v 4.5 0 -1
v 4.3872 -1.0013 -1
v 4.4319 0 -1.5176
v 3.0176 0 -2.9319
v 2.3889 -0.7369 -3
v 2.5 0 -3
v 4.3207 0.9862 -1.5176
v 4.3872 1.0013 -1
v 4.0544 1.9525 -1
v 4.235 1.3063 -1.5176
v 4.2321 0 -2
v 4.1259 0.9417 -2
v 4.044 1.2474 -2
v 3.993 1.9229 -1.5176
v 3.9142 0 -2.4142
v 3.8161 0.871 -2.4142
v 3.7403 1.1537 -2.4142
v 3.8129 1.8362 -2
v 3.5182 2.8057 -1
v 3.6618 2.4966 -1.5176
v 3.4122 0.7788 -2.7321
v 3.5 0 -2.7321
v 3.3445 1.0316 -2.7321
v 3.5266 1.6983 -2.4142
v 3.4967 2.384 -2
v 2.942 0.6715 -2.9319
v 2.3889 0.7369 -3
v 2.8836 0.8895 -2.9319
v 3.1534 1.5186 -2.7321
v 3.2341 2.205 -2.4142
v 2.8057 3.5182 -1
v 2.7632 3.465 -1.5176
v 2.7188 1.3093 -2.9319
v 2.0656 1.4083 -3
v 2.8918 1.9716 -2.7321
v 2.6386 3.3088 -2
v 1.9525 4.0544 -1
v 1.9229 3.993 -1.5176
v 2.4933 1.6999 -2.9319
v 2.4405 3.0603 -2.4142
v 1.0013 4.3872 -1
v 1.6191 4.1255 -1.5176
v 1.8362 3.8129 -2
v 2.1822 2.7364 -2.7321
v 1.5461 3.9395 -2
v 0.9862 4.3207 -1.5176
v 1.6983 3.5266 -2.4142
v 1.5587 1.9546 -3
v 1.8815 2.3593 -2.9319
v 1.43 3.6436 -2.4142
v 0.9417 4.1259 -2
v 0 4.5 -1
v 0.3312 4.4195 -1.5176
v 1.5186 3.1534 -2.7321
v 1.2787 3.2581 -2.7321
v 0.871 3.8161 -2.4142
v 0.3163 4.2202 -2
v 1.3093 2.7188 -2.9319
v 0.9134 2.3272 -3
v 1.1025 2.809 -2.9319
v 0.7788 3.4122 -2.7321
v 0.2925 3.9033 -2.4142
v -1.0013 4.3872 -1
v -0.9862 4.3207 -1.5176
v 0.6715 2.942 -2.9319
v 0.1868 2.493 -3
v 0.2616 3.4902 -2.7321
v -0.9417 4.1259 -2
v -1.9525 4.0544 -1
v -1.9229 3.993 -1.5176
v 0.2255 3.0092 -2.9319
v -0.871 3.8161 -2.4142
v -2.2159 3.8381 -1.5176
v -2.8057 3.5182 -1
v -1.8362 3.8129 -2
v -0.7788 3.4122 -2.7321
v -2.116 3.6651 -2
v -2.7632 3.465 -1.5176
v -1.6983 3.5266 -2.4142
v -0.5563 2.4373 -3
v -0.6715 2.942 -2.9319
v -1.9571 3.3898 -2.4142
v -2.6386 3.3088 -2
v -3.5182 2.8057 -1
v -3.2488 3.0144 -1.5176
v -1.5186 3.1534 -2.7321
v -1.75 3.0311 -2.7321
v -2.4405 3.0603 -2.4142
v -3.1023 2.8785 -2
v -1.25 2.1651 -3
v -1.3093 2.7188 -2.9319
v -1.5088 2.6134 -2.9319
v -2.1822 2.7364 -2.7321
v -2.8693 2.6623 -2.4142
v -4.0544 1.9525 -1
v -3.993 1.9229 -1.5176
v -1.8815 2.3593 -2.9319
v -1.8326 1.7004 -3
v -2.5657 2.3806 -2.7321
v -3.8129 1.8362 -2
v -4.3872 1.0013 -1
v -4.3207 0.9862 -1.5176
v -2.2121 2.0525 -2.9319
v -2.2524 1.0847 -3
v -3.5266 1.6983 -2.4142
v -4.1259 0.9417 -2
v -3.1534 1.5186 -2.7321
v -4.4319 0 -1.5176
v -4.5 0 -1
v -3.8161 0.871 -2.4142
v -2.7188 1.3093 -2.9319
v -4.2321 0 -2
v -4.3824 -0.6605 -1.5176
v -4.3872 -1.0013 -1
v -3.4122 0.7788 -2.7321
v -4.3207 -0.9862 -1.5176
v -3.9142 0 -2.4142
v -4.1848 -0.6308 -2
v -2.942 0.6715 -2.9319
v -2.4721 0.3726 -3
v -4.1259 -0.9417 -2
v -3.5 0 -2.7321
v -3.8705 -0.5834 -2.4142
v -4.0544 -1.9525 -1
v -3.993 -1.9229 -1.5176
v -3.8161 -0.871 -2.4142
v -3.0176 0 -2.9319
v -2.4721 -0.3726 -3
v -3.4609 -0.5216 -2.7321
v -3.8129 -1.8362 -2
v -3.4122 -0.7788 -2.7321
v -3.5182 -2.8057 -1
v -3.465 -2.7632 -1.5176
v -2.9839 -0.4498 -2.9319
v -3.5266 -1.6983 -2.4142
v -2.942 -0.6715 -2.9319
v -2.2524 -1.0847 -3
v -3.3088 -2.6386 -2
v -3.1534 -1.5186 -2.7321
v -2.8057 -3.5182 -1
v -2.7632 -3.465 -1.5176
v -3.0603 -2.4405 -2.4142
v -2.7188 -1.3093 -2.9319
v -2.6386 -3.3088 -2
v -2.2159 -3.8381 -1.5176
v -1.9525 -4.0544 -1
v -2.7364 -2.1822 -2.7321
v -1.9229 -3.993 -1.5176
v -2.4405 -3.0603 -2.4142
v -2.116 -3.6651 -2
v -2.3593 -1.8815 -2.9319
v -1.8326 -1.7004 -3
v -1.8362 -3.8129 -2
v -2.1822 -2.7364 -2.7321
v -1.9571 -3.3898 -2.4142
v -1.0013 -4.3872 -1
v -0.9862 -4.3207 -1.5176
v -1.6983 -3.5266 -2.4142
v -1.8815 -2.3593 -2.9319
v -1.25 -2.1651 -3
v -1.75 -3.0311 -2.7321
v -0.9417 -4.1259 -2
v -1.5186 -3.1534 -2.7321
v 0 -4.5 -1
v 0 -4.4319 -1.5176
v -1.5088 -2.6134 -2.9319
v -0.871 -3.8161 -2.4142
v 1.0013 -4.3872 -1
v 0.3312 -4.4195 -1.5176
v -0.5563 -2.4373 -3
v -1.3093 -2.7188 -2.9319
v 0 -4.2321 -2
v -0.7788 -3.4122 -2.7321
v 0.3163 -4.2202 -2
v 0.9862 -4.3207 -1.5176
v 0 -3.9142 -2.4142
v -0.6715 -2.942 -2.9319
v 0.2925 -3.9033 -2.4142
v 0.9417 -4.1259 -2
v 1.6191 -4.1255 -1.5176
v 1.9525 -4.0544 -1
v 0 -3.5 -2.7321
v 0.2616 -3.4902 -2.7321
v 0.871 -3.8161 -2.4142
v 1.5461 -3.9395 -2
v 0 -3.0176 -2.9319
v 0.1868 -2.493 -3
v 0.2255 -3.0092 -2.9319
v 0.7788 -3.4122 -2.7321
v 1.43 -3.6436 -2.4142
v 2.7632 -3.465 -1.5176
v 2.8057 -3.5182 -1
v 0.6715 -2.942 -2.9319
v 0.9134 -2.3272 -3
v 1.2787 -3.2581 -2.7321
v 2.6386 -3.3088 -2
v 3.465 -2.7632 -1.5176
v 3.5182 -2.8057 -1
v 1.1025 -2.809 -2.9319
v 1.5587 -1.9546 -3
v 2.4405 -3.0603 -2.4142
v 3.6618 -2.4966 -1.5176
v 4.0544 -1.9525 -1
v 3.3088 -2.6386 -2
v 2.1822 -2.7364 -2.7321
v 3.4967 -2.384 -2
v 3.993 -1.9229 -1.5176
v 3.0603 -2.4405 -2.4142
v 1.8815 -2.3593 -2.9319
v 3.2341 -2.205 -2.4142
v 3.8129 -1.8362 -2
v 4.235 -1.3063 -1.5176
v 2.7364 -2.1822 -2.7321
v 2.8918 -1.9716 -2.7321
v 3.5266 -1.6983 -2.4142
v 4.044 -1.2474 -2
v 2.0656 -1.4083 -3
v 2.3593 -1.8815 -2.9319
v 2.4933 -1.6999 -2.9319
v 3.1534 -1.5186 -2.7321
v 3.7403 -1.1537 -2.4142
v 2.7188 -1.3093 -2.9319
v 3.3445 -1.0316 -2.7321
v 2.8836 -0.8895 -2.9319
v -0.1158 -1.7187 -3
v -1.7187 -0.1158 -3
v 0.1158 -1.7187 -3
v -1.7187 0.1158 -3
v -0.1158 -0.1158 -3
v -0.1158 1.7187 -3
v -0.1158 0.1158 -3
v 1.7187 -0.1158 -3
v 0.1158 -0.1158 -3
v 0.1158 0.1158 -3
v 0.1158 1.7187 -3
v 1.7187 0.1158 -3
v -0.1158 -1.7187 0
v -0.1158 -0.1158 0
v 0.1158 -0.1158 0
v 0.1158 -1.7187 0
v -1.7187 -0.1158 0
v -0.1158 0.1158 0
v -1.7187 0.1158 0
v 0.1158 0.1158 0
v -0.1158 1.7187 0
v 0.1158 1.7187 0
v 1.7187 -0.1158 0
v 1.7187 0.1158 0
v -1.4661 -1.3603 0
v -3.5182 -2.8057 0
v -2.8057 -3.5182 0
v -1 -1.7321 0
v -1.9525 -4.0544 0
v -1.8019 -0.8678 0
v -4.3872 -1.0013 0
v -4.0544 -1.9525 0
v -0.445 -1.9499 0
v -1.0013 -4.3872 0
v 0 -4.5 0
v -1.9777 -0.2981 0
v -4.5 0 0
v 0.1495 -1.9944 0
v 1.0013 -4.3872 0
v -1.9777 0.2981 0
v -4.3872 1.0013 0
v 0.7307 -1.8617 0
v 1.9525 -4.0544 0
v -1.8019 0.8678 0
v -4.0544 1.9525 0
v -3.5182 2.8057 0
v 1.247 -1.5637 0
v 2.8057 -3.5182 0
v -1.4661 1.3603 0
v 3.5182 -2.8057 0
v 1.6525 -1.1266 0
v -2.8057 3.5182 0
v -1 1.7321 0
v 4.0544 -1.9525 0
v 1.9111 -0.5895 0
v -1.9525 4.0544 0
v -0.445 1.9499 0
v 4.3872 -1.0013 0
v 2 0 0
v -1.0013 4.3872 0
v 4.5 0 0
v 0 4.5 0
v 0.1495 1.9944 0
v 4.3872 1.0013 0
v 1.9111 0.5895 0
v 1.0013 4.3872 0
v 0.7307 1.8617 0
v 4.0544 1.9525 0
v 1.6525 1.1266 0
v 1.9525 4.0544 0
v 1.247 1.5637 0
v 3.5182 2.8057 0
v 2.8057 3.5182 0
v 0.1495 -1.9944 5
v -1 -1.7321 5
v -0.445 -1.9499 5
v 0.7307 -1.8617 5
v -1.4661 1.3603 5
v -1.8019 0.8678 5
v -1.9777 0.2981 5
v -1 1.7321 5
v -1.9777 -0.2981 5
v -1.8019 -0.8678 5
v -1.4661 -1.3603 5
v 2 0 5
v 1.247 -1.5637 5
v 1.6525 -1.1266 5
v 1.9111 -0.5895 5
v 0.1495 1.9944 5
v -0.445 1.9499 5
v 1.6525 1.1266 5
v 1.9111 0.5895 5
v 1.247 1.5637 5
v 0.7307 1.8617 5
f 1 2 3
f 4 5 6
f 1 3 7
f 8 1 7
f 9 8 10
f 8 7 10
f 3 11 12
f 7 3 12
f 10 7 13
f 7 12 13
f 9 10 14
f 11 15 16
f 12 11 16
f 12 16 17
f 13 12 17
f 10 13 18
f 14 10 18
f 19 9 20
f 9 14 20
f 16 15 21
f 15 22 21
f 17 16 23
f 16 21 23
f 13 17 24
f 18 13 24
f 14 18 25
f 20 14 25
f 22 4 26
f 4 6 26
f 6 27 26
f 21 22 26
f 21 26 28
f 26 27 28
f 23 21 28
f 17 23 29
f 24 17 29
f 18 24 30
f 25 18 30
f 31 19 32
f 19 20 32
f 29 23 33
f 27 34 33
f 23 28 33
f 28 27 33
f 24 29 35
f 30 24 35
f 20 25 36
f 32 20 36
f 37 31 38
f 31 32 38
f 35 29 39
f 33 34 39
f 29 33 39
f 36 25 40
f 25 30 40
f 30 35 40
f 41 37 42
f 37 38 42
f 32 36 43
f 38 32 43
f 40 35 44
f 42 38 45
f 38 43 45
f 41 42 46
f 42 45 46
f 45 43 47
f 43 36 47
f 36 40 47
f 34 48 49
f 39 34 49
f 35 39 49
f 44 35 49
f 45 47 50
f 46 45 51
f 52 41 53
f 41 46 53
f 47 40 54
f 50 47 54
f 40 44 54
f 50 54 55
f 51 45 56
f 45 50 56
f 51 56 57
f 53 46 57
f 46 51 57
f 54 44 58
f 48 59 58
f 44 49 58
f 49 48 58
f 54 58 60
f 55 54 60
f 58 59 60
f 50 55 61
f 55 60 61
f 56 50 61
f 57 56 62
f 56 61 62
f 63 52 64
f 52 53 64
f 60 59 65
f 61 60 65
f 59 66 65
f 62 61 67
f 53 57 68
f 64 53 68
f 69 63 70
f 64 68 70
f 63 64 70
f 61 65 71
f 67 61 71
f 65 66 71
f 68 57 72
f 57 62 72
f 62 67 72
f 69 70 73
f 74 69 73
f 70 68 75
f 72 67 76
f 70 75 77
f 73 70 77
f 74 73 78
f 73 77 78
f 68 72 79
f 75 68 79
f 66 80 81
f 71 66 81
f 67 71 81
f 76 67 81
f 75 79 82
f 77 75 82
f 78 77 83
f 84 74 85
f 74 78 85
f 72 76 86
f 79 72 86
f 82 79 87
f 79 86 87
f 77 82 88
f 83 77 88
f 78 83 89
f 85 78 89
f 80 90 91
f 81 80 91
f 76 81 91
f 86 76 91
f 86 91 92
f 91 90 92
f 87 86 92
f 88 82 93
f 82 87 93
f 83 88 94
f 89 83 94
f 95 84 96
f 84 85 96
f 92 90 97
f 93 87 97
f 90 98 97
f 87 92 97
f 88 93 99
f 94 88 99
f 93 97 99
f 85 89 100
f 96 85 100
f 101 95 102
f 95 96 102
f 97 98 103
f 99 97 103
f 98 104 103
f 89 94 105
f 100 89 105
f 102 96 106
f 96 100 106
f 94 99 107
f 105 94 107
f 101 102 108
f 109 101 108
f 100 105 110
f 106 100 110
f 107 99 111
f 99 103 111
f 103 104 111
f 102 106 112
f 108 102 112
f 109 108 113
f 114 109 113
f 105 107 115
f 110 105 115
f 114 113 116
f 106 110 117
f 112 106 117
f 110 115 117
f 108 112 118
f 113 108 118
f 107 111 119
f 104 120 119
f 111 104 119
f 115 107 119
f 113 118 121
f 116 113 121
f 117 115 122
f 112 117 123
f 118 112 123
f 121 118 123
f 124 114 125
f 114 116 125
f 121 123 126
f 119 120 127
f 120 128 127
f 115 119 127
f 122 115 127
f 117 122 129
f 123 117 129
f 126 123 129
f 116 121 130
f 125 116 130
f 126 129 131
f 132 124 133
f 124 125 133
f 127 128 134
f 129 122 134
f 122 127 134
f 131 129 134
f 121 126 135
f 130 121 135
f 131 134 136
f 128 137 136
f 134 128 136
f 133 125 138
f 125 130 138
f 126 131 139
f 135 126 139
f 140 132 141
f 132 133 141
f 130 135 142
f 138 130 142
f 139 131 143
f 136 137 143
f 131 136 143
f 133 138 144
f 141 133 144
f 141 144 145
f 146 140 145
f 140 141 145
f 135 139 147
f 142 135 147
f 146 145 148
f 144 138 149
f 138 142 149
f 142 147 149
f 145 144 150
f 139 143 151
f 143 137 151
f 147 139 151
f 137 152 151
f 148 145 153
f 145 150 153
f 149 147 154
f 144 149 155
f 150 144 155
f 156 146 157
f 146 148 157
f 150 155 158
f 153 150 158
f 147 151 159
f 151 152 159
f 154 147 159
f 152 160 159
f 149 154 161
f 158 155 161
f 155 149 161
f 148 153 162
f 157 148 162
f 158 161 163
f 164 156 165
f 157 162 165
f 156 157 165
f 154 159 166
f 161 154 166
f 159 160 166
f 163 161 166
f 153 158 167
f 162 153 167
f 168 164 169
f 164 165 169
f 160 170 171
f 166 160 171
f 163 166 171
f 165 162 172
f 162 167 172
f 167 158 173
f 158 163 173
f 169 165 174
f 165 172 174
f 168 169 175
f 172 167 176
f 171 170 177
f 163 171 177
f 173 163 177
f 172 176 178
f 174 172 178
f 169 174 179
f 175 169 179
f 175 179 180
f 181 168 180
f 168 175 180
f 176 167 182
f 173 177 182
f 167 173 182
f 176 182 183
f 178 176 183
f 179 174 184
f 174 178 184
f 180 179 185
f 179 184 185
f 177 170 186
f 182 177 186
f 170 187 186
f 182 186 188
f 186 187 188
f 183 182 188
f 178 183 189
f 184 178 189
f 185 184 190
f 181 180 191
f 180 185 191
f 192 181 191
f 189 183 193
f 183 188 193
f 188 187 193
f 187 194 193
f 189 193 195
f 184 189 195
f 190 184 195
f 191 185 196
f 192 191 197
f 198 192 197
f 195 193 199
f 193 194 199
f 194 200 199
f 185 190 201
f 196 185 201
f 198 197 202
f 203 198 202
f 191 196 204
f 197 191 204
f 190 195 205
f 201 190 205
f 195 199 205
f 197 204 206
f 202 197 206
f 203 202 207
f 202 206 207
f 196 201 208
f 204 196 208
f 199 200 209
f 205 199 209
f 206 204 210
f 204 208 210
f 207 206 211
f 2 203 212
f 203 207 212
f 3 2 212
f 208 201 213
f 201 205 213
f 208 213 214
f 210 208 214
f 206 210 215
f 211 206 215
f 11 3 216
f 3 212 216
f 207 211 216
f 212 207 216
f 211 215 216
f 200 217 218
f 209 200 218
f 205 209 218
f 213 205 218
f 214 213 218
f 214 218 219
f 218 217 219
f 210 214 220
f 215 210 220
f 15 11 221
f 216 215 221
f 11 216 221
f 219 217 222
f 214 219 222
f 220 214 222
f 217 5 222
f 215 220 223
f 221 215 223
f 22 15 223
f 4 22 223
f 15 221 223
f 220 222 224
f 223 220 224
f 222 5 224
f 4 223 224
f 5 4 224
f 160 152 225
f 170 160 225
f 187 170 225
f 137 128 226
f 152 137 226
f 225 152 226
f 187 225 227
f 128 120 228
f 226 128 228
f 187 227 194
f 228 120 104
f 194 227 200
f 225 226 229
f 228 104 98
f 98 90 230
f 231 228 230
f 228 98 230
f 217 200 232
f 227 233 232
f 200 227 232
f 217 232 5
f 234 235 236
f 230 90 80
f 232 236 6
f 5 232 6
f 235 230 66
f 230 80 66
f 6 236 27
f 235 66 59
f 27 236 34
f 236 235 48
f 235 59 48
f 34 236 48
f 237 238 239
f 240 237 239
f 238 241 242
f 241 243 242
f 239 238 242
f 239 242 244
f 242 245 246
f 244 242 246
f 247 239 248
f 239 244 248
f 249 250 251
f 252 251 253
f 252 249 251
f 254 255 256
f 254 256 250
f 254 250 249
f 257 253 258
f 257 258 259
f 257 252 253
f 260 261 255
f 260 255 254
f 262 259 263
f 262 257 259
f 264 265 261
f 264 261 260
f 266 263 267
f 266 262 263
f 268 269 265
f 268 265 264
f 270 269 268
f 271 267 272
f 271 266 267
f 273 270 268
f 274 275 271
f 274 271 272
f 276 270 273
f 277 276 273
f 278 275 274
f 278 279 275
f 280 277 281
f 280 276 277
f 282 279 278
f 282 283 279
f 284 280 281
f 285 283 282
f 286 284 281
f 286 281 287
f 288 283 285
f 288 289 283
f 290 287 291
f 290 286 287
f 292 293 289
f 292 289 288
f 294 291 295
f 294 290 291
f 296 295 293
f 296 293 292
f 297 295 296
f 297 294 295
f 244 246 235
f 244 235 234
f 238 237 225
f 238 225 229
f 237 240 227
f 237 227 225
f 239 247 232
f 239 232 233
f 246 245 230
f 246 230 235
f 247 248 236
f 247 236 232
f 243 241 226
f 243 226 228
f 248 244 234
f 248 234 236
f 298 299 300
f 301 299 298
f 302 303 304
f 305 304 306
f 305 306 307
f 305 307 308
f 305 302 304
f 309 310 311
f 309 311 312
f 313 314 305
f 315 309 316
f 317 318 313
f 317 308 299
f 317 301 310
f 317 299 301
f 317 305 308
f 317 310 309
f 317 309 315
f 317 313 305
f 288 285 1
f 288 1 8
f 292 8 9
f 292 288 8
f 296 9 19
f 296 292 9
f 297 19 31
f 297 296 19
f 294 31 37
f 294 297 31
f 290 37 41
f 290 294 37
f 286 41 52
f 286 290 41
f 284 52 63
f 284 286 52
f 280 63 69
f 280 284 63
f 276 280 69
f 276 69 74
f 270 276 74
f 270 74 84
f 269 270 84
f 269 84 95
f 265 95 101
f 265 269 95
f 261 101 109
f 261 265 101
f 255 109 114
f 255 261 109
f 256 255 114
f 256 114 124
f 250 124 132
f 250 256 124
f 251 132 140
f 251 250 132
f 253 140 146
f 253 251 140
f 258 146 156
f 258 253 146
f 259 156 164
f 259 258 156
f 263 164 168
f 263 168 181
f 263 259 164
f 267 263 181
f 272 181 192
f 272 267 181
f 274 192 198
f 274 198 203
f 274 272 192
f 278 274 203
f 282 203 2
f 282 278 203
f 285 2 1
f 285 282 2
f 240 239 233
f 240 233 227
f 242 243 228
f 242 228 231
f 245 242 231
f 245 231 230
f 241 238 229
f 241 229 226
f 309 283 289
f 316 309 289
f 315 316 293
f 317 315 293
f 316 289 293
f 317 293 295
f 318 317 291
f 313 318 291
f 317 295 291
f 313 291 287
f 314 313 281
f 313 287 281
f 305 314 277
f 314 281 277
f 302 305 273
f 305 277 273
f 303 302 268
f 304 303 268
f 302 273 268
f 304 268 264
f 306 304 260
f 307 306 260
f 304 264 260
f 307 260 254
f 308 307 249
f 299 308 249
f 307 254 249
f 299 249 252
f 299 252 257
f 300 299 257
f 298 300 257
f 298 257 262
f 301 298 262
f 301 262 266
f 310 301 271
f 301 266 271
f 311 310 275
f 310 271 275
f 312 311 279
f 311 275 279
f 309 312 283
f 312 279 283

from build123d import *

# Parameters (mm, degrees)
ESQUISSE1_R        = 2
BOSS_EXTRU_1_DEPTH = 5
ESQUISSE2_R        = 4.5
BOSS_EXTRU_2_DEPTH = 3
CONG_1_R           = 2


with BuildPart() as part:
    # Esquisse1 → Boss.-Extru.1 (new body)
    with BuildSketch(Plane.XY):
        Circle(ESQUISSE1_R)
    extrude(amount=BOSS_EXTRU_1_DEPTH)

    # Esquisse2 → Boss.-Extru.2 (add)
    with BuildSketch(Plane.XY):
        Circle(ESQUISSE2_R)
        Polygon((-1.718731116, -0.115769453), (-1.718731116, 0.115769453), (-0.115769453, 0.115769453), (-0.115769453, 1.718731116), (0.115769453, 1.718731116), (0.115769453, 0.115769453), (1.718731116, 0.115769453), (1.718731116, -0.115769453), (0.115769453, -0.115769453), (0.115769453, -1.718731116), (-0.115769453, -1.718731116), (-0.115769453, -0.115769453), align=None, mode=Mode.SUBTRACT)
    extrude(amount=-BOSS_EXTRU_2_DEPTH)

    # Congé1
    cong_1_edges = [part.edges().sort_by_distance(p)[0] for p in [
        (-4.5, 0, -3),
    ]]
    fillet(cong_1_edges, radius=CONG_1_R)


solid = part.part
